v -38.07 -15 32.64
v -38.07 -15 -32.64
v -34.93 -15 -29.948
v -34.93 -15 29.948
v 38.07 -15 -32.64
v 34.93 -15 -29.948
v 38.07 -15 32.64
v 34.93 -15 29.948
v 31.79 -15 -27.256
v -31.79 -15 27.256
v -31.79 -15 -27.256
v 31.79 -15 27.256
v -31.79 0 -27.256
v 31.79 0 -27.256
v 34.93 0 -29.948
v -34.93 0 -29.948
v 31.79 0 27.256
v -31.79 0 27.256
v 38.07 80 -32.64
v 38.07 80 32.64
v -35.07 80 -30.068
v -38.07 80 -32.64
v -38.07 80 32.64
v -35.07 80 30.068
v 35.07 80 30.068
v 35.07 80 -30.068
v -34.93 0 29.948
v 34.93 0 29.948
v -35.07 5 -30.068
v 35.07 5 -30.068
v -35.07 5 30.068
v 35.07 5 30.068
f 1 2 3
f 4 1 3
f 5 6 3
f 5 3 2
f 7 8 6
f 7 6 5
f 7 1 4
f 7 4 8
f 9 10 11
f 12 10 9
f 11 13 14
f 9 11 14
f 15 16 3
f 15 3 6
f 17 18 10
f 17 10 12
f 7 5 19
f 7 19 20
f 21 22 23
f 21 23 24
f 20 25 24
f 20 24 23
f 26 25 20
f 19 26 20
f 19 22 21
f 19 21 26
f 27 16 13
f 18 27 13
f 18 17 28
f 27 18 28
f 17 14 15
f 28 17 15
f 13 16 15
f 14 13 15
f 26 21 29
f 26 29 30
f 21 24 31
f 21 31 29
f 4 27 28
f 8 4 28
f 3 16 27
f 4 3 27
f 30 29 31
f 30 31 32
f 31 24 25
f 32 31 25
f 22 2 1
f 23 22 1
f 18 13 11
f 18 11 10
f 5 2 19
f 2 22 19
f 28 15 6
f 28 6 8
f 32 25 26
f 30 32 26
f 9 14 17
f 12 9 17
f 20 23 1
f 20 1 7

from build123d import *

# Parameters (mm, degrees)
SKETCH1_W           = 76.14
SKETCH1_H           = 65.28
BOSS_EXTRUDE1_DEPTH = 80
SKETCH3_W           = 76.14
SKETCH3_H           = 65.28
SKETCH3_W_2         = 69.86
SKETCH3_H_2         = 59.89572892
BOSS_EXTRUDE2_DEPTH = 15
SKETCH4_W           = 70.14
SKETCH4_H           = 60.135791962
CUT_EXTRUDE1_DEPTH  = 75
SKETCH5_W           = 63.58
SKETCH5_H           = 54.51145784
BOSS_EXTRUDE3_DEPTH = 15


with BuildPart() as part:
    # Sketch1 → Boss-Extrude1 (new body)
    with BuildSketch(Plane(origin=(0, 0, 0), x_dir=(1, 0, 0), z_dir=(0, 1, 0))):
        Rectangle(SKETCH1_W, SKETCH1_H)
    extrude(amount=BOSS_EXTRUDE1_DEPTH)

    # Sketch3 → Boss-Extrude2 (add)
    with BuildSketch(Plane.XZ):
        Rectangle(SKETCH3_W, SKETCH3_H)
        Rectangle(SKETCH3_W_2, SKETCH3_H_2, mode=Mode.SUBTRACT)
    extrude(amount=BOSS_EXTRUDE2_DEPTH)

    # Sketch4 → Cut-Extrude1 (cut)
    with BuildSketch(Plane(origin=(0, 80, 0), x_dir=(1, 0, 0), z_dir=(0, 1, 0))):
        Rectangle(SKETCH4_W, SKETCH4_H)
    extrude(amount=-CUT_EXTRUDE1_DEPTH, mode=Mode.SUBTRACT)

    # Sketch5 → Boss-Extrude3 (add)
    with BuildSketch(Plane.XZ):
        Rectangle(SKETCH5_W, SKETCH5_H)
    extrude(amount=BOSS_EXTRUDE3_DEPTH)


solid = part.part
